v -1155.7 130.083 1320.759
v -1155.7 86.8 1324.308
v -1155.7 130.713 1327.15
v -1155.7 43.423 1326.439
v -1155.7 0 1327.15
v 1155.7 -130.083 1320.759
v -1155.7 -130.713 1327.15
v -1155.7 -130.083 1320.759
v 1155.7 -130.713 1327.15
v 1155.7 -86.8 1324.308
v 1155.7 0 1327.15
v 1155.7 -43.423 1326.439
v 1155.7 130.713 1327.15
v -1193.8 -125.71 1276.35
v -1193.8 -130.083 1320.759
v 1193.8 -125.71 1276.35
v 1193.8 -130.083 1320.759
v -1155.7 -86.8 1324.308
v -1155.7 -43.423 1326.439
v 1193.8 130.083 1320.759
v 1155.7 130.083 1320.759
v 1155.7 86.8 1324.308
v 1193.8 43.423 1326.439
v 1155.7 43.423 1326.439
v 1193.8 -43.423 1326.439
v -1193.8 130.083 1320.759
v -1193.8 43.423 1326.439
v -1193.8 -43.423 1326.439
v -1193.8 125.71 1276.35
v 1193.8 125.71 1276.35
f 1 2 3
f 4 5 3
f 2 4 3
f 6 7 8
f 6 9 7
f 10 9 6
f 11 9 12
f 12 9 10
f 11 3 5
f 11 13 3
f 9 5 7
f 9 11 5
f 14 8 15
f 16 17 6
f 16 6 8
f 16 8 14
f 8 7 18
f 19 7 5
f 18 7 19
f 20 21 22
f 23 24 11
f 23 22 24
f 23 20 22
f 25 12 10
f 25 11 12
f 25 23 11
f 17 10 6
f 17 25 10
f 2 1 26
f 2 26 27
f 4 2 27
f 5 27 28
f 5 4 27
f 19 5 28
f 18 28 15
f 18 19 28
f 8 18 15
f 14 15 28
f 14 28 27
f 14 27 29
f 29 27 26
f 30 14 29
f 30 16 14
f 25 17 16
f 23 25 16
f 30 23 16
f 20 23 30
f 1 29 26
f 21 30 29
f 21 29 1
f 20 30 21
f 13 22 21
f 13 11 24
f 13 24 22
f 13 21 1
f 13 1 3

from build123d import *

# Parameters (mm, degrees)
F1_DEPTH = 1193.8
F2_DEPTH = 1155.7


with BuildPart() as f1:
    # F0 (on Right) → F1 (new body, symmetric)
    with BuildSketch(Plane.YZ):
        with BuildLine():
            Line((125.7095026749, 1276.35), (130.0834477884, 1320.759410003))
            ThreePointArc((130.0834477884, 1320.759410003), (65.1201645529, 1325.5513896747), (1.1399e-06, 1327.15))
            ThreePointArc((1.1399e-06, 1327.15), (-65.1201634144, 1325.5513897307), (-130.0834477884, 1320.759410003))
            Line((-130.0834477884, 1320.759410003), (-125.7095026749, 1276.35))
            Line((-125.7095026749, 1276.35), (125.7095026749, 1276.35))
        make_face()
    extrude(amount=F1_DEPTH, both=True)

    # F0 (on Right) → F2 (join, symmetric)
    with BuildSketch(Plane.YZ):
        with BuildLine():
            Line((-130.7128659655, 1327.15), (-130.0834477884, 1320.759410003))
            ThreePointArc((-130.0834477884, 1320.759410003), (-65.1201634144, 1325.5513897307), (1.1399e-06, 1327.15))
            Line((1.1399e-06, 1327.15), (-130.7128659655, 1327.15))
        make_face()
        with BuildLine():
            ThreePointArc((1.1399e-06, 1327.15), (65.1201645529, 1325.5513896747), (130.0834477884, 1320.759410003))
            Line((130.0834477884, 1320.759410003), (130.7128659655, 1327.15))
            Line((130.7128659655, 1327.15), (1.1399e-06, 1327.15))
        make_face()
    extrude(amount=F2_DEPTH, both=True)


solid = f1.part
